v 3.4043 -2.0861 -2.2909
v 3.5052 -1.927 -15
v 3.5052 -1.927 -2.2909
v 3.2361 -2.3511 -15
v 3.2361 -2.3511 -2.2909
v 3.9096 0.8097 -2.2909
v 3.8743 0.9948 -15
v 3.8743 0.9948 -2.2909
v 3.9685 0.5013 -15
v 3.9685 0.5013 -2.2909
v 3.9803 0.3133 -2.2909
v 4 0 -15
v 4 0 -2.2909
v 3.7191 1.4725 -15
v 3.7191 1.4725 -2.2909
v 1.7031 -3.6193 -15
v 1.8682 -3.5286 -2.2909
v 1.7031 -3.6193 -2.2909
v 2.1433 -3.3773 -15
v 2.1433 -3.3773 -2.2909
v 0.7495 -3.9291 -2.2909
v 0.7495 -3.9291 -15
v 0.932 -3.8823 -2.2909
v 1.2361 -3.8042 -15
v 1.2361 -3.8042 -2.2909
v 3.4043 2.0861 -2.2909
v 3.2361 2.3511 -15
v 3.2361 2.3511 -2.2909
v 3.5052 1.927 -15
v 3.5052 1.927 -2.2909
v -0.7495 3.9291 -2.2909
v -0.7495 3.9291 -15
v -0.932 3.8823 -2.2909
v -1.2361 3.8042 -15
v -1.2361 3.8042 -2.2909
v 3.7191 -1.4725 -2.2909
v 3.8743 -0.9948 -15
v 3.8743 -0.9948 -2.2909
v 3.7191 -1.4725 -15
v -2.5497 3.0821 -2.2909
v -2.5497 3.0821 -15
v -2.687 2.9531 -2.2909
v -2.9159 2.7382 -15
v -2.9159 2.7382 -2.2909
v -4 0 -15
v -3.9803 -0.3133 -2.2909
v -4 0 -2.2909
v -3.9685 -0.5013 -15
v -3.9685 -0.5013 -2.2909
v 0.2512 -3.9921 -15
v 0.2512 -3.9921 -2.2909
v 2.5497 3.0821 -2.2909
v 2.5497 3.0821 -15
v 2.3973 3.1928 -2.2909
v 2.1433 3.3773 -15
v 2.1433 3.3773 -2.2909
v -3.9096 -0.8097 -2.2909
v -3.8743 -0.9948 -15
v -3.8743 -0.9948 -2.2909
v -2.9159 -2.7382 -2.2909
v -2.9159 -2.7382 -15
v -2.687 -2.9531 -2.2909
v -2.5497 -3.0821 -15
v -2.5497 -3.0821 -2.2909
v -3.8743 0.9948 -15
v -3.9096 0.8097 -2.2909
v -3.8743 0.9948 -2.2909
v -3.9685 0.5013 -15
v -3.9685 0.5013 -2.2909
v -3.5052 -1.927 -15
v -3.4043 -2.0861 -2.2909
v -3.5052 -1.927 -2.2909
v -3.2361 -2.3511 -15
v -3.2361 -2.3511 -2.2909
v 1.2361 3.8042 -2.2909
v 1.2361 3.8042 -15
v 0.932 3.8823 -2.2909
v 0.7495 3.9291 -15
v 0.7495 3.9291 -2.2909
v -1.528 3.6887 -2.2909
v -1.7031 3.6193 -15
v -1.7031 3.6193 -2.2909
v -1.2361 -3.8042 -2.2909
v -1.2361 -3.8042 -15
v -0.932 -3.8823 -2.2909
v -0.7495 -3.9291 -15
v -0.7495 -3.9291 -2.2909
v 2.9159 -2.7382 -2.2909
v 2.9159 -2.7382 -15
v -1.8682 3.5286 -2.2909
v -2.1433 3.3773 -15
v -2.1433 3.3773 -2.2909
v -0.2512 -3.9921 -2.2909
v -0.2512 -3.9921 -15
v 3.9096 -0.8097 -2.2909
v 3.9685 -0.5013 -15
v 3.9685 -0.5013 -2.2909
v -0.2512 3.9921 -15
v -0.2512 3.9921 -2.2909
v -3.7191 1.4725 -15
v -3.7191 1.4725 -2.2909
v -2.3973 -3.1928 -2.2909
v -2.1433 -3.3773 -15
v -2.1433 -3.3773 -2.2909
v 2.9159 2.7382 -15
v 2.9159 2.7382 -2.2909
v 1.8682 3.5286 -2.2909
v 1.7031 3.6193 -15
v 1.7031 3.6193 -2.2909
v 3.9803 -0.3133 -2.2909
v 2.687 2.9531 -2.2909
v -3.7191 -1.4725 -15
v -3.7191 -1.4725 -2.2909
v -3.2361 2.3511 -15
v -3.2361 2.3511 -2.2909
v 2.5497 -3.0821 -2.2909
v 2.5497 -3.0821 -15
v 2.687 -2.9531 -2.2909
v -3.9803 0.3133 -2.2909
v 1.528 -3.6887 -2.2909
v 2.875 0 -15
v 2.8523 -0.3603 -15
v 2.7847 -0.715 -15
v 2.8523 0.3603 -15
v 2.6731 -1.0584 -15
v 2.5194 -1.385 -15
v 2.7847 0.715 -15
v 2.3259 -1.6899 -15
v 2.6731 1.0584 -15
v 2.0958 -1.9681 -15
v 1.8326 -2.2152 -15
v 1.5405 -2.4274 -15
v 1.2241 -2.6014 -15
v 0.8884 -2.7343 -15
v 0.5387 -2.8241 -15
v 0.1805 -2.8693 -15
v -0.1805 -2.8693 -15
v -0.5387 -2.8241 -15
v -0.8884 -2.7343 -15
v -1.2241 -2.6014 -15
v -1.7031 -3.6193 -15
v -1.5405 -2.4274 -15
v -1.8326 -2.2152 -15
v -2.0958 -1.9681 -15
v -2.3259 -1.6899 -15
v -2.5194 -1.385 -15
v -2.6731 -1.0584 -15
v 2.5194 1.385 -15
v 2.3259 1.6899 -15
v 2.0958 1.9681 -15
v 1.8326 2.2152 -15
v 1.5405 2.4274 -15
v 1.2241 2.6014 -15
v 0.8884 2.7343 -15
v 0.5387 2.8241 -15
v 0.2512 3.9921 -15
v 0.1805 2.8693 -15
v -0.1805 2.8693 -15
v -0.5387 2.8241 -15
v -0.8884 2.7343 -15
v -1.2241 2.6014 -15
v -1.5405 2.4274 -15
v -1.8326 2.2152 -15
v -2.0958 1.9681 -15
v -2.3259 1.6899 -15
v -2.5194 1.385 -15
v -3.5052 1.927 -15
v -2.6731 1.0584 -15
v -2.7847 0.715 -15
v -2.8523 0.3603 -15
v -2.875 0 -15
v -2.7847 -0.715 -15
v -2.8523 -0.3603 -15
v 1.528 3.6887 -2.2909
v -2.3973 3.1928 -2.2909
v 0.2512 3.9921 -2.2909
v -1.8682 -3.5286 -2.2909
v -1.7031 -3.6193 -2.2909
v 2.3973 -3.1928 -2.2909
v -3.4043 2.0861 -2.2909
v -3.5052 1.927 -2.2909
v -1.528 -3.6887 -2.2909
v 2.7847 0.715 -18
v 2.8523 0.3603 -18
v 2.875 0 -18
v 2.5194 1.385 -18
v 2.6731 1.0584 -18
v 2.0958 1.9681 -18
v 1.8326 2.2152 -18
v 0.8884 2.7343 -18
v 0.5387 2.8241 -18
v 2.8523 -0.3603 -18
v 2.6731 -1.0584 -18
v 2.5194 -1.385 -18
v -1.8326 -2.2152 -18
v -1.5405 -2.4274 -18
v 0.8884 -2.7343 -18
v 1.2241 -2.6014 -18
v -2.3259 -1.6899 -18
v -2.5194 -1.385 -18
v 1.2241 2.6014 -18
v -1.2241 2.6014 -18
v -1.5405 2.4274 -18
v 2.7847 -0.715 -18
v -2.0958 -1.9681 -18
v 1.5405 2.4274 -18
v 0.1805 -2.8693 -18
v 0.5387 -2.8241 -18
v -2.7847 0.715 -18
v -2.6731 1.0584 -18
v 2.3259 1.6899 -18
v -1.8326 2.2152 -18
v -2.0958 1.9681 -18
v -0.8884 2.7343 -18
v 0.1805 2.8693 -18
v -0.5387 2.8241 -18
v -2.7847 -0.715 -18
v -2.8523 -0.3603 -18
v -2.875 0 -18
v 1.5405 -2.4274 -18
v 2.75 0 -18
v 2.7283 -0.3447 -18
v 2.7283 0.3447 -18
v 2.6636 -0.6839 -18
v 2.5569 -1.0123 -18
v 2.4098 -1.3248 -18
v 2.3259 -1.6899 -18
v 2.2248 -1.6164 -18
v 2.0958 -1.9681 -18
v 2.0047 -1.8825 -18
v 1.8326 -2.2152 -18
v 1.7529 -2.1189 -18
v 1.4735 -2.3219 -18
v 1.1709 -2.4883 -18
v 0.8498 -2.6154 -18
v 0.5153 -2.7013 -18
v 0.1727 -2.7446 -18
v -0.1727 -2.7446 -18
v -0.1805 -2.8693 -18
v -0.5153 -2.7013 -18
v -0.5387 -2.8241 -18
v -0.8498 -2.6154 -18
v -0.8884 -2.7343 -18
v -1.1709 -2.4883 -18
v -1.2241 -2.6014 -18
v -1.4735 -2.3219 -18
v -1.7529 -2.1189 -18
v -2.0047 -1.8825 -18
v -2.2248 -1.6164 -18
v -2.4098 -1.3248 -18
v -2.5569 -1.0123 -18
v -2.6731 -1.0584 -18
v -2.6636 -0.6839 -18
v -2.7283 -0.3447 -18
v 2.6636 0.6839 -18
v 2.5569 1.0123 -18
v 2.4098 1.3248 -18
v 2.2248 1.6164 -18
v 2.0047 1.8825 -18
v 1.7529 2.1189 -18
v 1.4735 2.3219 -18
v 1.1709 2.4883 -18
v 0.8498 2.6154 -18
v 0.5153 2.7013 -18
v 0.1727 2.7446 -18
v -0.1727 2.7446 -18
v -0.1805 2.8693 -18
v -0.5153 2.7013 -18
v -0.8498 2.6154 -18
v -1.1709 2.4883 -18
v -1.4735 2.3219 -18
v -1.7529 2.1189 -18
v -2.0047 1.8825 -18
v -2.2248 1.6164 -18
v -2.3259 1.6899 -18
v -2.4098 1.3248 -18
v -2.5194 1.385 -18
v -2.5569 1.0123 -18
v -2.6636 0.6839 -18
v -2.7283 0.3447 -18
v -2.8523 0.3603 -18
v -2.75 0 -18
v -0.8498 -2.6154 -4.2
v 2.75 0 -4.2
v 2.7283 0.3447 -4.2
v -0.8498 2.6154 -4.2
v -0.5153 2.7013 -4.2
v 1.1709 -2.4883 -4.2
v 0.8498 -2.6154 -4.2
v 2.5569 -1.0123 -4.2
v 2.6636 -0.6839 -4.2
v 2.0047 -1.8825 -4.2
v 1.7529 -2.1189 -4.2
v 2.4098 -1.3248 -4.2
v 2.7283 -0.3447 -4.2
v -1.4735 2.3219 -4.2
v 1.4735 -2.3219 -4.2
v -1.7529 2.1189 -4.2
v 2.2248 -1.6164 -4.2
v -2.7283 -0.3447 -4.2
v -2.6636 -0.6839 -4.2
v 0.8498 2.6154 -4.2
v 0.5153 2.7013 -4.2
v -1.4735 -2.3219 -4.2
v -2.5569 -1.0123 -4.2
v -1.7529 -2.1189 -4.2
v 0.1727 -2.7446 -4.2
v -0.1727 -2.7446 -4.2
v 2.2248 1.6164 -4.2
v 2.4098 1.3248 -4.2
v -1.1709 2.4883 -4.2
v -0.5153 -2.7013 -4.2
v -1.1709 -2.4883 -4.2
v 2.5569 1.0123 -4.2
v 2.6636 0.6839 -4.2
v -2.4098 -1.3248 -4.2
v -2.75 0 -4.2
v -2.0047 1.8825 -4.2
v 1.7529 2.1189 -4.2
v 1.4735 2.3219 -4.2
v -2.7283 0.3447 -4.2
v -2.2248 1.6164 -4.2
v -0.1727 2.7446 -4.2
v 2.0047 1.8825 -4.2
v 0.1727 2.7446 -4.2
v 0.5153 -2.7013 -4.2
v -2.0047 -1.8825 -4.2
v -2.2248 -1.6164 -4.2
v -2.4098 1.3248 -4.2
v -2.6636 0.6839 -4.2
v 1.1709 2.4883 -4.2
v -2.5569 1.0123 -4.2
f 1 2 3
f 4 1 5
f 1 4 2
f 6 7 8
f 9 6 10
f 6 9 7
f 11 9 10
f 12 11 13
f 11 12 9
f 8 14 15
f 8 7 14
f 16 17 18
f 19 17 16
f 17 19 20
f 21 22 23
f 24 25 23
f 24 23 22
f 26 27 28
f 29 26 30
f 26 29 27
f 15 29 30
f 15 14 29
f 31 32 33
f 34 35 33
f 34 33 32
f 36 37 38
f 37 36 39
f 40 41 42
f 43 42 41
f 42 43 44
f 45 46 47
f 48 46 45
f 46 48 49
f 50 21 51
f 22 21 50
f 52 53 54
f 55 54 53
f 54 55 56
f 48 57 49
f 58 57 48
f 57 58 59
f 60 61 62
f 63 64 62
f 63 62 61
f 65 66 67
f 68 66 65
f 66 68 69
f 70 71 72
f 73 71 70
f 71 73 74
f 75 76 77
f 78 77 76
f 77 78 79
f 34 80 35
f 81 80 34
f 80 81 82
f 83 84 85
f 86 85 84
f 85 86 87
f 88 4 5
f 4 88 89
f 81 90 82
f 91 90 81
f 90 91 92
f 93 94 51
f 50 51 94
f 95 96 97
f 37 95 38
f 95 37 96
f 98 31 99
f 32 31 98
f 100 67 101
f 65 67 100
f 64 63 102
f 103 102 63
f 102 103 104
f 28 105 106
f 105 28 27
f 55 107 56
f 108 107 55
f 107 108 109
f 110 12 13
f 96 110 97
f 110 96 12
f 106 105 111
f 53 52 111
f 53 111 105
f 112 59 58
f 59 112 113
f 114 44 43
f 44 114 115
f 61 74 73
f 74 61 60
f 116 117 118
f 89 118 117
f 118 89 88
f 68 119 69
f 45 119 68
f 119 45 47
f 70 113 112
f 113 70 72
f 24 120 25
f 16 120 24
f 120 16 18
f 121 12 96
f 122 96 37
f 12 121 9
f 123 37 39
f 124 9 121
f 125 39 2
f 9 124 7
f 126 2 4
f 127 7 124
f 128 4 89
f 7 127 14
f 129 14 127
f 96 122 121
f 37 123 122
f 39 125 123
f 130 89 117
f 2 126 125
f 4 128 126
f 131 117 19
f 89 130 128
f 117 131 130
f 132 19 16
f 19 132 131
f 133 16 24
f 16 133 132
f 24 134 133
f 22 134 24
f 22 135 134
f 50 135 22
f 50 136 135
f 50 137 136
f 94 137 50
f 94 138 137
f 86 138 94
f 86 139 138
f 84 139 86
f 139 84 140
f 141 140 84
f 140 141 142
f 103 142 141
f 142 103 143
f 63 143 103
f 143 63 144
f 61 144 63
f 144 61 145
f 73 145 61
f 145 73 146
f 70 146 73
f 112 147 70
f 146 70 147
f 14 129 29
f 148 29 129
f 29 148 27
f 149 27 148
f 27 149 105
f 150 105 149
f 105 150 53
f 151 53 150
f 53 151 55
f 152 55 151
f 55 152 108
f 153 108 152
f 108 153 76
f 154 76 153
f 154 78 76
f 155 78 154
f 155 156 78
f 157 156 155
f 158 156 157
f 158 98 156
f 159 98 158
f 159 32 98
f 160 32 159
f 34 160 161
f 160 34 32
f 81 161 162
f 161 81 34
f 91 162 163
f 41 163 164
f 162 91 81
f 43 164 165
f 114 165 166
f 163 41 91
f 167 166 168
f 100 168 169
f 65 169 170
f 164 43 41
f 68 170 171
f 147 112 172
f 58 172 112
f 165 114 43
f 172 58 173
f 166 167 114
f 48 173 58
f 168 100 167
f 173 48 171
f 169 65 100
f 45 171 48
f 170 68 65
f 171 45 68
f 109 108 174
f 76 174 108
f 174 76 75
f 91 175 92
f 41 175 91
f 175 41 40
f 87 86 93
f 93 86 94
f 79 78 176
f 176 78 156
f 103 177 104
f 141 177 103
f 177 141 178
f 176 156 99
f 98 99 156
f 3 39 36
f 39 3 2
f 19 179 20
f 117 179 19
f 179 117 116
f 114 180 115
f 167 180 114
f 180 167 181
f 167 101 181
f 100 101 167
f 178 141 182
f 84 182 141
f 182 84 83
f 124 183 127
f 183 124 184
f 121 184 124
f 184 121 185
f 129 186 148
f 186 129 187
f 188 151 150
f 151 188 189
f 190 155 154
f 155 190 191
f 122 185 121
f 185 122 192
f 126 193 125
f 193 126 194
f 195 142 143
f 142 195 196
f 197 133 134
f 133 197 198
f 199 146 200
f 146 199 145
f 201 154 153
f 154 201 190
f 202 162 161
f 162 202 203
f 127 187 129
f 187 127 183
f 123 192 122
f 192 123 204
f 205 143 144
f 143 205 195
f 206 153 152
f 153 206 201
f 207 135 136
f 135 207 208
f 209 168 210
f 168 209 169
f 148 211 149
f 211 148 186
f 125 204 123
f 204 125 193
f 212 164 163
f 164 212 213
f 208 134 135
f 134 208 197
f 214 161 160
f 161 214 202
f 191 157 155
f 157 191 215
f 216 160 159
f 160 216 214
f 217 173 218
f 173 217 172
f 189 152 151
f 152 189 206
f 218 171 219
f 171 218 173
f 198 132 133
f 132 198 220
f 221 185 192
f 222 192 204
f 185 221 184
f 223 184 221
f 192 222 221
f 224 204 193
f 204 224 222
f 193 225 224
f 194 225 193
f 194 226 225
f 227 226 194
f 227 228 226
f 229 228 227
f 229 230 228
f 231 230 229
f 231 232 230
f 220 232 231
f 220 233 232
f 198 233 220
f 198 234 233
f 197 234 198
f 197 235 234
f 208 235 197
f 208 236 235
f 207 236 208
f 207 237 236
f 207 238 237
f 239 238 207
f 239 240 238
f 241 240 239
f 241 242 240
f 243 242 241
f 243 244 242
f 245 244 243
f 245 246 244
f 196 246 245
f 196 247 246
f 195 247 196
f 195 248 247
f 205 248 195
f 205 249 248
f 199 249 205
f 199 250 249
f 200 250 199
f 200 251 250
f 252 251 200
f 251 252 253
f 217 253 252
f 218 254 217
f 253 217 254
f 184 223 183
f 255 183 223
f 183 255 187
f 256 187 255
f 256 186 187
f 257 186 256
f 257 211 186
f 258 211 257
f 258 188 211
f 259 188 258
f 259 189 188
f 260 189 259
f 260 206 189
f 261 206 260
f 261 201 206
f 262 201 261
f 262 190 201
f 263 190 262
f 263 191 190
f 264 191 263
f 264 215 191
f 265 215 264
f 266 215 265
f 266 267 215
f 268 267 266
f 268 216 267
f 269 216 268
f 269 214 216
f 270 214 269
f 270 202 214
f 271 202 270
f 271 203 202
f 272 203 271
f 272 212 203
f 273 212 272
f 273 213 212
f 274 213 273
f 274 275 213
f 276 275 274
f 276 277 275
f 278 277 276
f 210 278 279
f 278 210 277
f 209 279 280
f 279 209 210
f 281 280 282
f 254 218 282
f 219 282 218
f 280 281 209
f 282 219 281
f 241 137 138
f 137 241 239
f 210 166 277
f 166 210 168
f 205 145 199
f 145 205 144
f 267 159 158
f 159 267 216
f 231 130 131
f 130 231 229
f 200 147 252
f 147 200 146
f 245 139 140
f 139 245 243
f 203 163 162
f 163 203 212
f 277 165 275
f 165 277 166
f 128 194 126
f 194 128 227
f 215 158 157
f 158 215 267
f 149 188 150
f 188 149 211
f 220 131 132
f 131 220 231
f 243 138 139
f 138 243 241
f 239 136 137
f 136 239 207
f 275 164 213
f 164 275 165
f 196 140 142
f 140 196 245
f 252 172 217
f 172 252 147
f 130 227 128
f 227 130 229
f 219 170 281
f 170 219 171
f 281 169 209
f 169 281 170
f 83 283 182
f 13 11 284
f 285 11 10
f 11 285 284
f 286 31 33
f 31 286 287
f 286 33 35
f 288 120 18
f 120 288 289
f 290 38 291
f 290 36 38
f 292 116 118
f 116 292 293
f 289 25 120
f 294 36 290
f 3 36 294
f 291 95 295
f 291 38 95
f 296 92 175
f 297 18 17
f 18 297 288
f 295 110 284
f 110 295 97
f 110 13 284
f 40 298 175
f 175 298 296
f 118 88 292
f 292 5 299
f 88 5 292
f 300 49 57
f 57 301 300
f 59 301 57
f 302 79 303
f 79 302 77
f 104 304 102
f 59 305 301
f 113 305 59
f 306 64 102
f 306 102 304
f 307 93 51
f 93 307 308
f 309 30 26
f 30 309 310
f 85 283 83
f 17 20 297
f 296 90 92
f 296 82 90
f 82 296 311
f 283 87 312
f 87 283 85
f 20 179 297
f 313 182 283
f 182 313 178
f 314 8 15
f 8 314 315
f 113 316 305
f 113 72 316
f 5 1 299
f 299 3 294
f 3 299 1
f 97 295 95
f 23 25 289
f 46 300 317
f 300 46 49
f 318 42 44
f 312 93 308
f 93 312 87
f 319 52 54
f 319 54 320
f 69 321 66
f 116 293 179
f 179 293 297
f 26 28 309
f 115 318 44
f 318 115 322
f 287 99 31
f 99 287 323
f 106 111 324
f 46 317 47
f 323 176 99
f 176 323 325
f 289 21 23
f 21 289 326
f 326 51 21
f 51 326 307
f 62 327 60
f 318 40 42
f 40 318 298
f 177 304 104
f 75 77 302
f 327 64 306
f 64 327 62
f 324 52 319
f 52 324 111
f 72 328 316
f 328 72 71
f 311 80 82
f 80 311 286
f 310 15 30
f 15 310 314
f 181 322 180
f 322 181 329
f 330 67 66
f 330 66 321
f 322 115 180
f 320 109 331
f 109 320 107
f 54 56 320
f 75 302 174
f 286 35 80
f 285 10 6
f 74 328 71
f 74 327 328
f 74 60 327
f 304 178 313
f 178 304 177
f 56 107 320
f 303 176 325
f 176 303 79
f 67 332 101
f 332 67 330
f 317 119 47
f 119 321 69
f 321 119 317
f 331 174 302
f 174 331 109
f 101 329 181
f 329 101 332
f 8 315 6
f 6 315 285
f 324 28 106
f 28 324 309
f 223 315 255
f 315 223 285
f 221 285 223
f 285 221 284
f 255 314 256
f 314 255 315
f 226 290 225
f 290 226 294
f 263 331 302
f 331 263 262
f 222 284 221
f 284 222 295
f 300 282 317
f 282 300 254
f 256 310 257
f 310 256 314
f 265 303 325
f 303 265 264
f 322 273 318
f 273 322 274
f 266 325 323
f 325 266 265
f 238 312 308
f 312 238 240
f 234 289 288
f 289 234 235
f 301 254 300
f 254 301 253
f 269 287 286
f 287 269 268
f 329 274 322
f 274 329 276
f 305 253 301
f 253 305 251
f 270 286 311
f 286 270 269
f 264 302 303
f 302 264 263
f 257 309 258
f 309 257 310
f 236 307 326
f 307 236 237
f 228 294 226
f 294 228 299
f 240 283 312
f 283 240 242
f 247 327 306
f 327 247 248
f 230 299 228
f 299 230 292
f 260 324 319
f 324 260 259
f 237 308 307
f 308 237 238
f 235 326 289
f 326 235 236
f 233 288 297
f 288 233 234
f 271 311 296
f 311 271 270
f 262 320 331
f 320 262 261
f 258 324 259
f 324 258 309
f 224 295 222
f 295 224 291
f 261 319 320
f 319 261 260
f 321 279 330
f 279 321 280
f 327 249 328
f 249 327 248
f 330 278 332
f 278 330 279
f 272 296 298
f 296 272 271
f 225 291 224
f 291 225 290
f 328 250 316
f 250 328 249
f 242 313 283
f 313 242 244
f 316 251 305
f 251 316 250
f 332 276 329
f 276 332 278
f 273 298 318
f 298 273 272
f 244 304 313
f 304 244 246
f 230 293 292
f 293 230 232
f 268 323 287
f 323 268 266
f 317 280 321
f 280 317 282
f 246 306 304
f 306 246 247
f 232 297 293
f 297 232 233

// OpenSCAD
$fn = 50;

difference() {
	union() {
		translate(v = [0, 0, -15.0]) {
			cylinder(h = 18, r = 4.0);
		}
		#translate(v = [0, 0, -18.0]) {
			cylinder(h = 18, r = 2.875);
		}
	}
	union() {
		translate(v = [0, 0, 0]) {
			rotate(a = [0, 0, 0]) {
				difference() {
					union() {
						translate(v = [0, 0, -18.0]) {
							cylinder(h = 18, r = 2.25);
						}
						translate(v = [0, 0, -4.2]) {
							cylinder(h = 4.2, r1 = 2.75, r2 = 5.5);
						}
						translate(v = [0, 0, -18.0]) {
							cylinder(h = 18, r = 2.75);
						}
						translate(v = [0, 0, -18.0]) {
							cylinder(h = 18, r = 2.25);
						}
					}
					union();
				}
			}
		}
		#cylinder(h = 3, r = 6.25);
	}
}
